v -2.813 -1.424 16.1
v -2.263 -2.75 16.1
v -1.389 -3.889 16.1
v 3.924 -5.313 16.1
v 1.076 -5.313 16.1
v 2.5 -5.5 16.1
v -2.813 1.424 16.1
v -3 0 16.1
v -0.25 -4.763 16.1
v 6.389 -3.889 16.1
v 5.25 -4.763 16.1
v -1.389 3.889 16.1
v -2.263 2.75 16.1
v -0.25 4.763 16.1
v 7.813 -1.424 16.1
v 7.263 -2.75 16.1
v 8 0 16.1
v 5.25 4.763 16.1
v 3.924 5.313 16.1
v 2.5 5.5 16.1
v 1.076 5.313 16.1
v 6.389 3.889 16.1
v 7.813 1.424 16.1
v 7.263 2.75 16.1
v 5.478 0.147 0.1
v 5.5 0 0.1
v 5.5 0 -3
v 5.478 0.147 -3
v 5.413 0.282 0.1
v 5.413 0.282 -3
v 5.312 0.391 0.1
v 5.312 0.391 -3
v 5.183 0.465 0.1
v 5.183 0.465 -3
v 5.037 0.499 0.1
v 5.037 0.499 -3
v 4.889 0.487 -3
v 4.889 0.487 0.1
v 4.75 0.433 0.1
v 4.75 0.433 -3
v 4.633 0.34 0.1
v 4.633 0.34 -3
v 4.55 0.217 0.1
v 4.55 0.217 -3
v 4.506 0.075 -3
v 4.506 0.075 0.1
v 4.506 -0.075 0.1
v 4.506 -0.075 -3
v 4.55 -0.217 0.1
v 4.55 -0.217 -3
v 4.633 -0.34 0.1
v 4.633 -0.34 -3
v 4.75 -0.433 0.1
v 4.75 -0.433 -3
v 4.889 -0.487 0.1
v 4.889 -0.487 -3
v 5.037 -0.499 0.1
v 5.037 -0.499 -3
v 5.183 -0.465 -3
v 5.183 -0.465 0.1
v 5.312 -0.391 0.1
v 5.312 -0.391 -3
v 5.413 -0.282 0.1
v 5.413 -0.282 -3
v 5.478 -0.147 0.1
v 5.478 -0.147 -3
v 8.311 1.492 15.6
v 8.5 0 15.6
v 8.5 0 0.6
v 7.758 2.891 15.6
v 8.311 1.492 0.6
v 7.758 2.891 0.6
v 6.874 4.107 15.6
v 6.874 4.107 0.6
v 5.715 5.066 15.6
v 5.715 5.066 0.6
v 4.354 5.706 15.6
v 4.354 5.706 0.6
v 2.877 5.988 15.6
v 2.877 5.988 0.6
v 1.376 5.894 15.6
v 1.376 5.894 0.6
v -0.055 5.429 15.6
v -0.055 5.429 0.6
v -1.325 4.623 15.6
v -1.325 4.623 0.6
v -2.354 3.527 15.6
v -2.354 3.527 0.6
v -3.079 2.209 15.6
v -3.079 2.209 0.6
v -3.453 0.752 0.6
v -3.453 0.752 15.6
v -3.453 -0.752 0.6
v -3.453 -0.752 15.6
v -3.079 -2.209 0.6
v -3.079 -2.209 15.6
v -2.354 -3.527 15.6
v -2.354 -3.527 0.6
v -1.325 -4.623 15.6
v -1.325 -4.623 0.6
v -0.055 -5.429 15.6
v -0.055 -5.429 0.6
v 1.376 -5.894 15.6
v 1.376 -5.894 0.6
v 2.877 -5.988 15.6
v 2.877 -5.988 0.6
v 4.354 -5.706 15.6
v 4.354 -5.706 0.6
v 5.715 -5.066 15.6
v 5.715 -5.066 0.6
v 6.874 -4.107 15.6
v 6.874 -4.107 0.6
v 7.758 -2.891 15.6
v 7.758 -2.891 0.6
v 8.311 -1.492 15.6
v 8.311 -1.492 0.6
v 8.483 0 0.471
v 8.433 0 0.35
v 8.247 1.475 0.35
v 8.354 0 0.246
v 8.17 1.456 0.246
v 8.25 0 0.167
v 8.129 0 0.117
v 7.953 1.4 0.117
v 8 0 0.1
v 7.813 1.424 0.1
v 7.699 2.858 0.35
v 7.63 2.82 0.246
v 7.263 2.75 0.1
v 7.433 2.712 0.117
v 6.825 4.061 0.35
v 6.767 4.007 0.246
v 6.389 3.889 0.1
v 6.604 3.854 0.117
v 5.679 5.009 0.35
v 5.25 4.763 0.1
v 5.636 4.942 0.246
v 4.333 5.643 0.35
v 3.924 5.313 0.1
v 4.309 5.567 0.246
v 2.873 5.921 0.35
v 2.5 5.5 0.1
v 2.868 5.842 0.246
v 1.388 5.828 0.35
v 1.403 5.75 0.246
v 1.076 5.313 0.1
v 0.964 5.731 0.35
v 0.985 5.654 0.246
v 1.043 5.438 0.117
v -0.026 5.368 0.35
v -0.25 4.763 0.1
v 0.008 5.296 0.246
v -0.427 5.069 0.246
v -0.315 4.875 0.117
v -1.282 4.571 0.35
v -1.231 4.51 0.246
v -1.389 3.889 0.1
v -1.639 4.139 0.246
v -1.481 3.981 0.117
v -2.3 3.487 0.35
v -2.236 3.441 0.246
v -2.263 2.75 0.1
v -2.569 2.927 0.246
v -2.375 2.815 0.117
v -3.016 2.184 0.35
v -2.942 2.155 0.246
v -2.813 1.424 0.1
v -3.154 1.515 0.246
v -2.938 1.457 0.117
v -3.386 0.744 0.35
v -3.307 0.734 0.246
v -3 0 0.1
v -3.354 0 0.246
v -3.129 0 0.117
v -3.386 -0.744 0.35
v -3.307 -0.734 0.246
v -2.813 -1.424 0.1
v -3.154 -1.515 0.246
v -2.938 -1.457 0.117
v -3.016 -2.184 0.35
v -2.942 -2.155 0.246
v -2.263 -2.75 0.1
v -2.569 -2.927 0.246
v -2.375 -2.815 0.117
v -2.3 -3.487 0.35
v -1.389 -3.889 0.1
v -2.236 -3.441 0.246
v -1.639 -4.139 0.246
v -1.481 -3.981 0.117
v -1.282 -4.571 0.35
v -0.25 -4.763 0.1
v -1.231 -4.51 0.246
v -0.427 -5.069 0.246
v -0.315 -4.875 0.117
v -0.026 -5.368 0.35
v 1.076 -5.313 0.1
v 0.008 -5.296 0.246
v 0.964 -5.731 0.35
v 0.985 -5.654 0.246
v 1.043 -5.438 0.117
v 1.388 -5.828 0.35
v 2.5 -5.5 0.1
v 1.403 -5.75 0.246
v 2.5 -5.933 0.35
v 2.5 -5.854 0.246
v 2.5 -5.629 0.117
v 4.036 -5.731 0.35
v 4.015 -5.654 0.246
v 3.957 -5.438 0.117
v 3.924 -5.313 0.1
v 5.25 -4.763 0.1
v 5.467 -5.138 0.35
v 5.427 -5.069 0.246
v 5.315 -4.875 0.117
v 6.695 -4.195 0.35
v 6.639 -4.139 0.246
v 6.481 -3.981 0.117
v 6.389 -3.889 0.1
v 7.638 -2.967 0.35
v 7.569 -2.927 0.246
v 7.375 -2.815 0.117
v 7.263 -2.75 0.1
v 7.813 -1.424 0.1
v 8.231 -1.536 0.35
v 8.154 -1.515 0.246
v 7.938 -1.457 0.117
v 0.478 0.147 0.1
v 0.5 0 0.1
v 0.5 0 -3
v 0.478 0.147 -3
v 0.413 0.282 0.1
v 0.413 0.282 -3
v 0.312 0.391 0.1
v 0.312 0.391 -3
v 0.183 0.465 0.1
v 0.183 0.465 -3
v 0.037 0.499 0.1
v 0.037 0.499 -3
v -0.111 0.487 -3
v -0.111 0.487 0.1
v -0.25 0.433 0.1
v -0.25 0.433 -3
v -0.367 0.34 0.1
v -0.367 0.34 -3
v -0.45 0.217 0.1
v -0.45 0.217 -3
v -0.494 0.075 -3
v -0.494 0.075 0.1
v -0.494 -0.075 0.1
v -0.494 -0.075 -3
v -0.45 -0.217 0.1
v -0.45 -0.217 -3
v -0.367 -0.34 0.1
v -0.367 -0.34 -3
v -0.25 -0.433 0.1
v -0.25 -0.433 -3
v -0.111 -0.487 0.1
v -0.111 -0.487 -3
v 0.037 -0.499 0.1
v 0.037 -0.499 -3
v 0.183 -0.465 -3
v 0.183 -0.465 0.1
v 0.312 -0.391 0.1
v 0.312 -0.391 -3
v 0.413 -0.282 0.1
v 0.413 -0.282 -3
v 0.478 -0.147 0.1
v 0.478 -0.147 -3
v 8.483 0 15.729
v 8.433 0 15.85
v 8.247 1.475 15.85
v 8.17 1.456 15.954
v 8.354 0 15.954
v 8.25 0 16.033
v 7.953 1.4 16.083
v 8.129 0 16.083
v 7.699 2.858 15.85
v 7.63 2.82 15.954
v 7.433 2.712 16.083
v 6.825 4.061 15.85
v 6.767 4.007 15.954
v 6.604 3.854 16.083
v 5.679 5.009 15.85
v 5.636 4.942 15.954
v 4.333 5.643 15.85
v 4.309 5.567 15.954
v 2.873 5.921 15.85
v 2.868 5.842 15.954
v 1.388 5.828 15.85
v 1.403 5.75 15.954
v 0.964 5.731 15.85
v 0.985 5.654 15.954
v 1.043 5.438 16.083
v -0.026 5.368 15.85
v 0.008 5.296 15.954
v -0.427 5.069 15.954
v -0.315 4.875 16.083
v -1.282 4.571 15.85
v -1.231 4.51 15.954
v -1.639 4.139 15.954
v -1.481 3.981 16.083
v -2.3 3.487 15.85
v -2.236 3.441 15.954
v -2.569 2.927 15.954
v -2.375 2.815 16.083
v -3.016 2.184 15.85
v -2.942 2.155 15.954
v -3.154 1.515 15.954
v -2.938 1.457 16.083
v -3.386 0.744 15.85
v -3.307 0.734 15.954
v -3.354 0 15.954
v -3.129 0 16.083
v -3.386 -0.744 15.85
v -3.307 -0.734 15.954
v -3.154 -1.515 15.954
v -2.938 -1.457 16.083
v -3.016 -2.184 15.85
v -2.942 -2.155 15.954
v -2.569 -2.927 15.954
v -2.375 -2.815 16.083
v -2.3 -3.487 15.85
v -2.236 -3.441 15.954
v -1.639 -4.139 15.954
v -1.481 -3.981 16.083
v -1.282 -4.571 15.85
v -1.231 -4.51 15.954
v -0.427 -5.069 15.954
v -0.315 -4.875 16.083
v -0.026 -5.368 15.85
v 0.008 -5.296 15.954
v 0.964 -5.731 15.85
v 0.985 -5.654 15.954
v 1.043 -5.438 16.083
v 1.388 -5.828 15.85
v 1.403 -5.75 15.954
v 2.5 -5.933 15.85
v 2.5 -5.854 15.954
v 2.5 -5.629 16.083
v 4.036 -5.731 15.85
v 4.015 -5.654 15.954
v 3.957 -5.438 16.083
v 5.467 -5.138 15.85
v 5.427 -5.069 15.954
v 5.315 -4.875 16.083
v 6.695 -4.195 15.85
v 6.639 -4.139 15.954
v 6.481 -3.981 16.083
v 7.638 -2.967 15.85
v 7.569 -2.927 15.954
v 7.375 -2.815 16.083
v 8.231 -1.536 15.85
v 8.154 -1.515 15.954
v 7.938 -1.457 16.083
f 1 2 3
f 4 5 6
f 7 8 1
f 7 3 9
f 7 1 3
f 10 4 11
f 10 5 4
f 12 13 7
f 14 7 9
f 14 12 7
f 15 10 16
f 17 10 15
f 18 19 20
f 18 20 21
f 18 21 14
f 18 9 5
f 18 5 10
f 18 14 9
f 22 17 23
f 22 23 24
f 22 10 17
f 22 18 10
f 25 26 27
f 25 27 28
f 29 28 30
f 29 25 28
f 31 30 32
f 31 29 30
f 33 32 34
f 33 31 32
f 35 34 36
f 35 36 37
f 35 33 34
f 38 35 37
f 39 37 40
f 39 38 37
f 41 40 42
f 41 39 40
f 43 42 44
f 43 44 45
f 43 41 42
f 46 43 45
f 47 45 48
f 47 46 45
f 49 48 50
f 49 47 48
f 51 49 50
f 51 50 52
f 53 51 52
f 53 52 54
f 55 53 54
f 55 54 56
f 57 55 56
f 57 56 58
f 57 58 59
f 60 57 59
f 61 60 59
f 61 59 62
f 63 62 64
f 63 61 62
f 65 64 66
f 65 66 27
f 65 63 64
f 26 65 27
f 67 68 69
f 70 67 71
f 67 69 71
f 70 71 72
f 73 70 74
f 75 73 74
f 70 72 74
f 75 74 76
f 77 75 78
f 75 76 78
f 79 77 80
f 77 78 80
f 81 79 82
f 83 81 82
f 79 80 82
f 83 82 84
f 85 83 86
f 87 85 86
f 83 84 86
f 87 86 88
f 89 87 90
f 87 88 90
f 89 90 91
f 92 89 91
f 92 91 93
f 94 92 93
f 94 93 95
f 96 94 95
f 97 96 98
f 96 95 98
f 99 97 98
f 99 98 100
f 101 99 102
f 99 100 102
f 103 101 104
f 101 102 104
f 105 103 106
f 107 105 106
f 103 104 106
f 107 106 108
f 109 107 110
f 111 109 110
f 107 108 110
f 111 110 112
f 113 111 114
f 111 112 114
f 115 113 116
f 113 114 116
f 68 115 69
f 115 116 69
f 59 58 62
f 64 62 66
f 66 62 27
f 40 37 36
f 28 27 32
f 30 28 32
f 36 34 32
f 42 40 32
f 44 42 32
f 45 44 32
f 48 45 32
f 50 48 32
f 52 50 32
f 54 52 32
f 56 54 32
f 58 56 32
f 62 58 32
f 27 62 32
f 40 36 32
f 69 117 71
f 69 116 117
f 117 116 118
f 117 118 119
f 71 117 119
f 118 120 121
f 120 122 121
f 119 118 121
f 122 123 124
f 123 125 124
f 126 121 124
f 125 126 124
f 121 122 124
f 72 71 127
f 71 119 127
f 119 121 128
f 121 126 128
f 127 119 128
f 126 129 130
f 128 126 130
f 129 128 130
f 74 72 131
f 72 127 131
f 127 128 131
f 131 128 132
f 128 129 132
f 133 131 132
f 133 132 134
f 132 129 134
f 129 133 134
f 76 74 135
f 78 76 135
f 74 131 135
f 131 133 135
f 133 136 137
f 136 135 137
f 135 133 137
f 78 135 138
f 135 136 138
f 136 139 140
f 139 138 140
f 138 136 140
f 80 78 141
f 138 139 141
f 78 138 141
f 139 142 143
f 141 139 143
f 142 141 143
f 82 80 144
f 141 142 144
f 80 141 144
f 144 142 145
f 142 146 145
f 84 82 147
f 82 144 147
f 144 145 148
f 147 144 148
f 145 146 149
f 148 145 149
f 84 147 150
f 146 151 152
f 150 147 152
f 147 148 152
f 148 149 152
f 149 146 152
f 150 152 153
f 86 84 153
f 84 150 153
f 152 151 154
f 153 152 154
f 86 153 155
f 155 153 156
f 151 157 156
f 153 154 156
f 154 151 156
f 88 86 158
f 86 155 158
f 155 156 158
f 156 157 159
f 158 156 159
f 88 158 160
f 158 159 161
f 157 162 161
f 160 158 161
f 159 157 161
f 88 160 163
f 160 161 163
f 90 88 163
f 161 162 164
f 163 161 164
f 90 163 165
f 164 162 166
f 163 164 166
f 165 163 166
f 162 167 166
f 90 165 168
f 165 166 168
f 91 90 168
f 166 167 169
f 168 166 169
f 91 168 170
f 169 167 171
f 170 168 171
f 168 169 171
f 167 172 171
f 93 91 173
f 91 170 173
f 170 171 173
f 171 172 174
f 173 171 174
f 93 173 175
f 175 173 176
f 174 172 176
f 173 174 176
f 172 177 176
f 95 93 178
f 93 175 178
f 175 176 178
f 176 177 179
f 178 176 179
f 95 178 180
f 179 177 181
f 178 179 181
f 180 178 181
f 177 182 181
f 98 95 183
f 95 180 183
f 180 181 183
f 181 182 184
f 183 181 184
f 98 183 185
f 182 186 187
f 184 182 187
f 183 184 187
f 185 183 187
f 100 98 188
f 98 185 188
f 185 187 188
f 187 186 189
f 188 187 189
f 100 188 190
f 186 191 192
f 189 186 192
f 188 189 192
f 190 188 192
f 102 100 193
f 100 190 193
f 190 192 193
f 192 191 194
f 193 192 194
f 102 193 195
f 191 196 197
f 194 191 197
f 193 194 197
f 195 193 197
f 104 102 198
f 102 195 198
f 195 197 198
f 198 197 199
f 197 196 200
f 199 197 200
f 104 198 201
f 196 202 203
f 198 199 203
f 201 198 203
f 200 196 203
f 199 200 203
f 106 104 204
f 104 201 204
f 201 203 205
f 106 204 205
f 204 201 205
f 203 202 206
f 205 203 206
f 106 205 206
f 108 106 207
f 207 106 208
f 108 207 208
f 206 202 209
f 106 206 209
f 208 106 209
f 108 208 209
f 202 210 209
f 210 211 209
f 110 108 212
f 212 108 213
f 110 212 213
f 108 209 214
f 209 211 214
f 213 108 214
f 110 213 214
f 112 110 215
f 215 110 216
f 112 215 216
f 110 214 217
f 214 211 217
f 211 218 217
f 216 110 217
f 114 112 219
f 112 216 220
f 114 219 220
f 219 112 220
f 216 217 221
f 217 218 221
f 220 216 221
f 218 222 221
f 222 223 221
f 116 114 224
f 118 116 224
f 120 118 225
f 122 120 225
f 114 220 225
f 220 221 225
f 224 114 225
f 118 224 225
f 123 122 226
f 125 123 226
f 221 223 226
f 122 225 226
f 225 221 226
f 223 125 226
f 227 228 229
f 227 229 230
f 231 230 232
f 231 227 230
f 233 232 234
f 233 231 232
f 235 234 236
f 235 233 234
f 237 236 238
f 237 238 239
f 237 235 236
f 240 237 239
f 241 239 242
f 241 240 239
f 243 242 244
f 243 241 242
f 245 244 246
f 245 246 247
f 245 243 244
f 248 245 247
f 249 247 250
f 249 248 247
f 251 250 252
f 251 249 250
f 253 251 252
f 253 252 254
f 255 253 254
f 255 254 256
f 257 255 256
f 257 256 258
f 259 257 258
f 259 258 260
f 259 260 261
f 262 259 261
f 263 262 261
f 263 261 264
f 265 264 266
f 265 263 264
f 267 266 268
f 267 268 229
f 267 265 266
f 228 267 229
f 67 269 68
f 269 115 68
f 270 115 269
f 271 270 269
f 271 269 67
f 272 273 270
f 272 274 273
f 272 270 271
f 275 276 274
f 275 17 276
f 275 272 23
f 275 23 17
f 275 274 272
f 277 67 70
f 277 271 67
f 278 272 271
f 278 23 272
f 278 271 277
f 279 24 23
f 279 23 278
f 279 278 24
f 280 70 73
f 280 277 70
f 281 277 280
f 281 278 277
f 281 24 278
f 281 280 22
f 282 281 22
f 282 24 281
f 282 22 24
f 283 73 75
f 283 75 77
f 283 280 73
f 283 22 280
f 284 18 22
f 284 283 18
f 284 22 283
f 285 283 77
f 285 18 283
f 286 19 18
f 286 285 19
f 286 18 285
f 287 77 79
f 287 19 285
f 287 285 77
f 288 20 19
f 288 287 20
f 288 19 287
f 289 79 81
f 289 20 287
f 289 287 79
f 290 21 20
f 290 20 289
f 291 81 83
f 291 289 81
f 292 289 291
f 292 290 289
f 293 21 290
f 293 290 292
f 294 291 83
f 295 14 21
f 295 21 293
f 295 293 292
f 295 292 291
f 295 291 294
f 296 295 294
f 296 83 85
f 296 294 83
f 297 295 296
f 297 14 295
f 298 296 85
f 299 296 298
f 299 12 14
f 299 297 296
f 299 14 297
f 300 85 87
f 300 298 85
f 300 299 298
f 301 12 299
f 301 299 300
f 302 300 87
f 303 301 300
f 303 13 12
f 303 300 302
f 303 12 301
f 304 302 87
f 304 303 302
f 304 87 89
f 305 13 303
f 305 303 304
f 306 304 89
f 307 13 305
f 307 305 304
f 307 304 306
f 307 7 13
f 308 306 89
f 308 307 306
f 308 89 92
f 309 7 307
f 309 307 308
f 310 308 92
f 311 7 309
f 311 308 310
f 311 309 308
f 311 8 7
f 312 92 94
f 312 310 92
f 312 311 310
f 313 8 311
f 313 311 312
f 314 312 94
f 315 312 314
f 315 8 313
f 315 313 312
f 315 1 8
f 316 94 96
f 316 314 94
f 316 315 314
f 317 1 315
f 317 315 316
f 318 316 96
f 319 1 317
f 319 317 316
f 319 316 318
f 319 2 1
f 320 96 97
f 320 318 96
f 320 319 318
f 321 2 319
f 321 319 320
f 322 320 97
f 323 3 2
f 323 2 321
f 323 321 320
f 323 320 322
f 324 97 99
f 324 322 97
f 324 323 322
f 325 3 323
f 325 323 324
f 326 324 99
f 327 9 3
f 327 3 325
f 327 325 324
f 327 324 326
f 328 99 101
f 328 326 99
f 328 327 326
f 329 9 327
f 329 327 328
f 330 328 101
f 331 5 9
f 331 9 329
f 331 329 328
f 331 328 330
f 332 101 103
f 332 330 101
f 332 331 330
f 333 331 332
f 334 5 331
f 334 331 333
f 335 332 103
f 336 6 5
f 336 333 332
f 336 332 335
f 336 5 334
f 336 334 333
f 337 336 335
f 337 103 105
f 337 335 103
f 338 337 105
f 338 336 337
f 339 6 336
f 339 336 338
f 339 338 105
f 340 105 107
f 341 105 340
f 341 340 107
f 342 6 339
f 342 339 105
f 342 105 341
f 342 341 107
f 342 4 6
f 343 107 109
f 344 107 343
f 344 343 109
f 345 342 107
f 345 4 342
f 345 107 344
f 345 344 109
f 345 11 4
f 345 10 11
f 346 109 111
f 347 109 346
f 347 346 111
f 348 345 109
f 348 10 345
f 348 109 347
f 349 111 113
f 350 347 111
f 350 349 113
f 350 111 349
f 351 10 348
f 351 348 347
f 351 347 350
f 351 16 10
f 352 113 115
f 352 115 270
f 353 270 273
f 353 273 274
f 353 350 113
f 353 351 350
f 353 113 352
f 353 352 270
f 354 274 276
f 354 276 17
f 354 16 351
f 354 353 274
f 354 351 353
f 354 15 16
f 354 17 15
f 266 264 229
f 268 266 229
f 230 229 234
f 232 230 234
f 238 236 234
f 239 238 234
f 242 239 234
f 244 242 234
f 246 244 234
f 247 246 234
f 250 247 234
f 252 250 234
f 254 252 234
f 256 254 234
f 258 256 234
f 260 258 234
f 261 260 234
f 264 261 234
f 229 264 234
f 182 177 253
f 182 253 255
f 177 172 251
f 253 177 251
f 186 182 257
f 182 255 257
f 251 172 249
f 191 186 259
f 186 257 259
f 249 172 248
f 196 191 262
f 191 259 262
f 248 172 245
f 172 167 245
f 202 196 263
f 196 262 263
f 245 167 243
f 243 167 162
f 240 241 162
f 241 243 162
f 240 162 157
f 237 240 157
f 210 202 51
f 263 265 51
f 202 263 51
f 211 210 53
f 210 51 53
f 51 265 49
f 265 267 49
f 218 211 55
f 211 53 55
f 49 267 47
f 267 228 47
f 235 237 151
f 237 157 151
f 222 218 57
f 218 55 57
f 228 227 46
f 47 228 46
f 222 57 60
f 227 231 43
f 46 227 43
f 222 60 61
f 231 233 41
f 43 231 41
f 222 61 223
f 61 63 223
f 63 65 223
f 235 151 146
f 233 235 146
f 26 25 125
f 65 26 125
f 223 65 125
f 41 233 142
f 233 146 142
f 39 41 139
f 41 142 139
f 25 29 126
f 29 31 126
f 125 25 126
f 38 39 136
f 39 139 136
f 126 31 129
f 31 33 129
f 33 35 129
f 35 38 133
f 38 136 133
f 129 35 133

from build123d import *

# Parameters (mm, degrees)
SKETCH001_R       = 0.5
PAD001_DEPTH      = 8
PAD001_DEPTH_BACK = 3.5
SKETCH_R          = 6
PAD_DEPTH         = 16
FILLET_R          = 0.5


with BuildPart() as pad001:
    # Sketch001 → Pad001 (new body, two sides)
    with BuildSketch(Plane.XY.offset(0.5)) as pad001_sk:
        Circle(SKETCH001_R)
        with Locations((5, 0)):
            Circle(SKETCH001_R)
    extrude(amount=PAD001_DEPTH)
    extrude(pad001_sk.sketch, amount=-PAD001_DEPTH_BACK)


with BuildPart() as l_radial_d12_0mm_p5_00mm_fastron_11p:
    # Sketch → Pad (new body)
    with BuildSketch(Plane.XY.offset(0.1)):
        with Locations((2.5, 0)):
            Circle(SKETCH_R)
    extrude(amount=PAD_DEPTH)

    # Fillet
    fillet_edges = [l_radial_d12_0mm_p5_00mm_fastron_11p.edges().sort_by_distance(p)[0] for p in [
        (-3.5, 0, 0.1),
        (-3.5, 0, 16.1),
    ]]
    fillet(fillet_edges, radius=FILLET_R)

    # Fillet_mp_cp: union Pad001
    add(pad001.part)


solid = l_radial_d12_0mm_p5_00mm_fastron_11p.part
